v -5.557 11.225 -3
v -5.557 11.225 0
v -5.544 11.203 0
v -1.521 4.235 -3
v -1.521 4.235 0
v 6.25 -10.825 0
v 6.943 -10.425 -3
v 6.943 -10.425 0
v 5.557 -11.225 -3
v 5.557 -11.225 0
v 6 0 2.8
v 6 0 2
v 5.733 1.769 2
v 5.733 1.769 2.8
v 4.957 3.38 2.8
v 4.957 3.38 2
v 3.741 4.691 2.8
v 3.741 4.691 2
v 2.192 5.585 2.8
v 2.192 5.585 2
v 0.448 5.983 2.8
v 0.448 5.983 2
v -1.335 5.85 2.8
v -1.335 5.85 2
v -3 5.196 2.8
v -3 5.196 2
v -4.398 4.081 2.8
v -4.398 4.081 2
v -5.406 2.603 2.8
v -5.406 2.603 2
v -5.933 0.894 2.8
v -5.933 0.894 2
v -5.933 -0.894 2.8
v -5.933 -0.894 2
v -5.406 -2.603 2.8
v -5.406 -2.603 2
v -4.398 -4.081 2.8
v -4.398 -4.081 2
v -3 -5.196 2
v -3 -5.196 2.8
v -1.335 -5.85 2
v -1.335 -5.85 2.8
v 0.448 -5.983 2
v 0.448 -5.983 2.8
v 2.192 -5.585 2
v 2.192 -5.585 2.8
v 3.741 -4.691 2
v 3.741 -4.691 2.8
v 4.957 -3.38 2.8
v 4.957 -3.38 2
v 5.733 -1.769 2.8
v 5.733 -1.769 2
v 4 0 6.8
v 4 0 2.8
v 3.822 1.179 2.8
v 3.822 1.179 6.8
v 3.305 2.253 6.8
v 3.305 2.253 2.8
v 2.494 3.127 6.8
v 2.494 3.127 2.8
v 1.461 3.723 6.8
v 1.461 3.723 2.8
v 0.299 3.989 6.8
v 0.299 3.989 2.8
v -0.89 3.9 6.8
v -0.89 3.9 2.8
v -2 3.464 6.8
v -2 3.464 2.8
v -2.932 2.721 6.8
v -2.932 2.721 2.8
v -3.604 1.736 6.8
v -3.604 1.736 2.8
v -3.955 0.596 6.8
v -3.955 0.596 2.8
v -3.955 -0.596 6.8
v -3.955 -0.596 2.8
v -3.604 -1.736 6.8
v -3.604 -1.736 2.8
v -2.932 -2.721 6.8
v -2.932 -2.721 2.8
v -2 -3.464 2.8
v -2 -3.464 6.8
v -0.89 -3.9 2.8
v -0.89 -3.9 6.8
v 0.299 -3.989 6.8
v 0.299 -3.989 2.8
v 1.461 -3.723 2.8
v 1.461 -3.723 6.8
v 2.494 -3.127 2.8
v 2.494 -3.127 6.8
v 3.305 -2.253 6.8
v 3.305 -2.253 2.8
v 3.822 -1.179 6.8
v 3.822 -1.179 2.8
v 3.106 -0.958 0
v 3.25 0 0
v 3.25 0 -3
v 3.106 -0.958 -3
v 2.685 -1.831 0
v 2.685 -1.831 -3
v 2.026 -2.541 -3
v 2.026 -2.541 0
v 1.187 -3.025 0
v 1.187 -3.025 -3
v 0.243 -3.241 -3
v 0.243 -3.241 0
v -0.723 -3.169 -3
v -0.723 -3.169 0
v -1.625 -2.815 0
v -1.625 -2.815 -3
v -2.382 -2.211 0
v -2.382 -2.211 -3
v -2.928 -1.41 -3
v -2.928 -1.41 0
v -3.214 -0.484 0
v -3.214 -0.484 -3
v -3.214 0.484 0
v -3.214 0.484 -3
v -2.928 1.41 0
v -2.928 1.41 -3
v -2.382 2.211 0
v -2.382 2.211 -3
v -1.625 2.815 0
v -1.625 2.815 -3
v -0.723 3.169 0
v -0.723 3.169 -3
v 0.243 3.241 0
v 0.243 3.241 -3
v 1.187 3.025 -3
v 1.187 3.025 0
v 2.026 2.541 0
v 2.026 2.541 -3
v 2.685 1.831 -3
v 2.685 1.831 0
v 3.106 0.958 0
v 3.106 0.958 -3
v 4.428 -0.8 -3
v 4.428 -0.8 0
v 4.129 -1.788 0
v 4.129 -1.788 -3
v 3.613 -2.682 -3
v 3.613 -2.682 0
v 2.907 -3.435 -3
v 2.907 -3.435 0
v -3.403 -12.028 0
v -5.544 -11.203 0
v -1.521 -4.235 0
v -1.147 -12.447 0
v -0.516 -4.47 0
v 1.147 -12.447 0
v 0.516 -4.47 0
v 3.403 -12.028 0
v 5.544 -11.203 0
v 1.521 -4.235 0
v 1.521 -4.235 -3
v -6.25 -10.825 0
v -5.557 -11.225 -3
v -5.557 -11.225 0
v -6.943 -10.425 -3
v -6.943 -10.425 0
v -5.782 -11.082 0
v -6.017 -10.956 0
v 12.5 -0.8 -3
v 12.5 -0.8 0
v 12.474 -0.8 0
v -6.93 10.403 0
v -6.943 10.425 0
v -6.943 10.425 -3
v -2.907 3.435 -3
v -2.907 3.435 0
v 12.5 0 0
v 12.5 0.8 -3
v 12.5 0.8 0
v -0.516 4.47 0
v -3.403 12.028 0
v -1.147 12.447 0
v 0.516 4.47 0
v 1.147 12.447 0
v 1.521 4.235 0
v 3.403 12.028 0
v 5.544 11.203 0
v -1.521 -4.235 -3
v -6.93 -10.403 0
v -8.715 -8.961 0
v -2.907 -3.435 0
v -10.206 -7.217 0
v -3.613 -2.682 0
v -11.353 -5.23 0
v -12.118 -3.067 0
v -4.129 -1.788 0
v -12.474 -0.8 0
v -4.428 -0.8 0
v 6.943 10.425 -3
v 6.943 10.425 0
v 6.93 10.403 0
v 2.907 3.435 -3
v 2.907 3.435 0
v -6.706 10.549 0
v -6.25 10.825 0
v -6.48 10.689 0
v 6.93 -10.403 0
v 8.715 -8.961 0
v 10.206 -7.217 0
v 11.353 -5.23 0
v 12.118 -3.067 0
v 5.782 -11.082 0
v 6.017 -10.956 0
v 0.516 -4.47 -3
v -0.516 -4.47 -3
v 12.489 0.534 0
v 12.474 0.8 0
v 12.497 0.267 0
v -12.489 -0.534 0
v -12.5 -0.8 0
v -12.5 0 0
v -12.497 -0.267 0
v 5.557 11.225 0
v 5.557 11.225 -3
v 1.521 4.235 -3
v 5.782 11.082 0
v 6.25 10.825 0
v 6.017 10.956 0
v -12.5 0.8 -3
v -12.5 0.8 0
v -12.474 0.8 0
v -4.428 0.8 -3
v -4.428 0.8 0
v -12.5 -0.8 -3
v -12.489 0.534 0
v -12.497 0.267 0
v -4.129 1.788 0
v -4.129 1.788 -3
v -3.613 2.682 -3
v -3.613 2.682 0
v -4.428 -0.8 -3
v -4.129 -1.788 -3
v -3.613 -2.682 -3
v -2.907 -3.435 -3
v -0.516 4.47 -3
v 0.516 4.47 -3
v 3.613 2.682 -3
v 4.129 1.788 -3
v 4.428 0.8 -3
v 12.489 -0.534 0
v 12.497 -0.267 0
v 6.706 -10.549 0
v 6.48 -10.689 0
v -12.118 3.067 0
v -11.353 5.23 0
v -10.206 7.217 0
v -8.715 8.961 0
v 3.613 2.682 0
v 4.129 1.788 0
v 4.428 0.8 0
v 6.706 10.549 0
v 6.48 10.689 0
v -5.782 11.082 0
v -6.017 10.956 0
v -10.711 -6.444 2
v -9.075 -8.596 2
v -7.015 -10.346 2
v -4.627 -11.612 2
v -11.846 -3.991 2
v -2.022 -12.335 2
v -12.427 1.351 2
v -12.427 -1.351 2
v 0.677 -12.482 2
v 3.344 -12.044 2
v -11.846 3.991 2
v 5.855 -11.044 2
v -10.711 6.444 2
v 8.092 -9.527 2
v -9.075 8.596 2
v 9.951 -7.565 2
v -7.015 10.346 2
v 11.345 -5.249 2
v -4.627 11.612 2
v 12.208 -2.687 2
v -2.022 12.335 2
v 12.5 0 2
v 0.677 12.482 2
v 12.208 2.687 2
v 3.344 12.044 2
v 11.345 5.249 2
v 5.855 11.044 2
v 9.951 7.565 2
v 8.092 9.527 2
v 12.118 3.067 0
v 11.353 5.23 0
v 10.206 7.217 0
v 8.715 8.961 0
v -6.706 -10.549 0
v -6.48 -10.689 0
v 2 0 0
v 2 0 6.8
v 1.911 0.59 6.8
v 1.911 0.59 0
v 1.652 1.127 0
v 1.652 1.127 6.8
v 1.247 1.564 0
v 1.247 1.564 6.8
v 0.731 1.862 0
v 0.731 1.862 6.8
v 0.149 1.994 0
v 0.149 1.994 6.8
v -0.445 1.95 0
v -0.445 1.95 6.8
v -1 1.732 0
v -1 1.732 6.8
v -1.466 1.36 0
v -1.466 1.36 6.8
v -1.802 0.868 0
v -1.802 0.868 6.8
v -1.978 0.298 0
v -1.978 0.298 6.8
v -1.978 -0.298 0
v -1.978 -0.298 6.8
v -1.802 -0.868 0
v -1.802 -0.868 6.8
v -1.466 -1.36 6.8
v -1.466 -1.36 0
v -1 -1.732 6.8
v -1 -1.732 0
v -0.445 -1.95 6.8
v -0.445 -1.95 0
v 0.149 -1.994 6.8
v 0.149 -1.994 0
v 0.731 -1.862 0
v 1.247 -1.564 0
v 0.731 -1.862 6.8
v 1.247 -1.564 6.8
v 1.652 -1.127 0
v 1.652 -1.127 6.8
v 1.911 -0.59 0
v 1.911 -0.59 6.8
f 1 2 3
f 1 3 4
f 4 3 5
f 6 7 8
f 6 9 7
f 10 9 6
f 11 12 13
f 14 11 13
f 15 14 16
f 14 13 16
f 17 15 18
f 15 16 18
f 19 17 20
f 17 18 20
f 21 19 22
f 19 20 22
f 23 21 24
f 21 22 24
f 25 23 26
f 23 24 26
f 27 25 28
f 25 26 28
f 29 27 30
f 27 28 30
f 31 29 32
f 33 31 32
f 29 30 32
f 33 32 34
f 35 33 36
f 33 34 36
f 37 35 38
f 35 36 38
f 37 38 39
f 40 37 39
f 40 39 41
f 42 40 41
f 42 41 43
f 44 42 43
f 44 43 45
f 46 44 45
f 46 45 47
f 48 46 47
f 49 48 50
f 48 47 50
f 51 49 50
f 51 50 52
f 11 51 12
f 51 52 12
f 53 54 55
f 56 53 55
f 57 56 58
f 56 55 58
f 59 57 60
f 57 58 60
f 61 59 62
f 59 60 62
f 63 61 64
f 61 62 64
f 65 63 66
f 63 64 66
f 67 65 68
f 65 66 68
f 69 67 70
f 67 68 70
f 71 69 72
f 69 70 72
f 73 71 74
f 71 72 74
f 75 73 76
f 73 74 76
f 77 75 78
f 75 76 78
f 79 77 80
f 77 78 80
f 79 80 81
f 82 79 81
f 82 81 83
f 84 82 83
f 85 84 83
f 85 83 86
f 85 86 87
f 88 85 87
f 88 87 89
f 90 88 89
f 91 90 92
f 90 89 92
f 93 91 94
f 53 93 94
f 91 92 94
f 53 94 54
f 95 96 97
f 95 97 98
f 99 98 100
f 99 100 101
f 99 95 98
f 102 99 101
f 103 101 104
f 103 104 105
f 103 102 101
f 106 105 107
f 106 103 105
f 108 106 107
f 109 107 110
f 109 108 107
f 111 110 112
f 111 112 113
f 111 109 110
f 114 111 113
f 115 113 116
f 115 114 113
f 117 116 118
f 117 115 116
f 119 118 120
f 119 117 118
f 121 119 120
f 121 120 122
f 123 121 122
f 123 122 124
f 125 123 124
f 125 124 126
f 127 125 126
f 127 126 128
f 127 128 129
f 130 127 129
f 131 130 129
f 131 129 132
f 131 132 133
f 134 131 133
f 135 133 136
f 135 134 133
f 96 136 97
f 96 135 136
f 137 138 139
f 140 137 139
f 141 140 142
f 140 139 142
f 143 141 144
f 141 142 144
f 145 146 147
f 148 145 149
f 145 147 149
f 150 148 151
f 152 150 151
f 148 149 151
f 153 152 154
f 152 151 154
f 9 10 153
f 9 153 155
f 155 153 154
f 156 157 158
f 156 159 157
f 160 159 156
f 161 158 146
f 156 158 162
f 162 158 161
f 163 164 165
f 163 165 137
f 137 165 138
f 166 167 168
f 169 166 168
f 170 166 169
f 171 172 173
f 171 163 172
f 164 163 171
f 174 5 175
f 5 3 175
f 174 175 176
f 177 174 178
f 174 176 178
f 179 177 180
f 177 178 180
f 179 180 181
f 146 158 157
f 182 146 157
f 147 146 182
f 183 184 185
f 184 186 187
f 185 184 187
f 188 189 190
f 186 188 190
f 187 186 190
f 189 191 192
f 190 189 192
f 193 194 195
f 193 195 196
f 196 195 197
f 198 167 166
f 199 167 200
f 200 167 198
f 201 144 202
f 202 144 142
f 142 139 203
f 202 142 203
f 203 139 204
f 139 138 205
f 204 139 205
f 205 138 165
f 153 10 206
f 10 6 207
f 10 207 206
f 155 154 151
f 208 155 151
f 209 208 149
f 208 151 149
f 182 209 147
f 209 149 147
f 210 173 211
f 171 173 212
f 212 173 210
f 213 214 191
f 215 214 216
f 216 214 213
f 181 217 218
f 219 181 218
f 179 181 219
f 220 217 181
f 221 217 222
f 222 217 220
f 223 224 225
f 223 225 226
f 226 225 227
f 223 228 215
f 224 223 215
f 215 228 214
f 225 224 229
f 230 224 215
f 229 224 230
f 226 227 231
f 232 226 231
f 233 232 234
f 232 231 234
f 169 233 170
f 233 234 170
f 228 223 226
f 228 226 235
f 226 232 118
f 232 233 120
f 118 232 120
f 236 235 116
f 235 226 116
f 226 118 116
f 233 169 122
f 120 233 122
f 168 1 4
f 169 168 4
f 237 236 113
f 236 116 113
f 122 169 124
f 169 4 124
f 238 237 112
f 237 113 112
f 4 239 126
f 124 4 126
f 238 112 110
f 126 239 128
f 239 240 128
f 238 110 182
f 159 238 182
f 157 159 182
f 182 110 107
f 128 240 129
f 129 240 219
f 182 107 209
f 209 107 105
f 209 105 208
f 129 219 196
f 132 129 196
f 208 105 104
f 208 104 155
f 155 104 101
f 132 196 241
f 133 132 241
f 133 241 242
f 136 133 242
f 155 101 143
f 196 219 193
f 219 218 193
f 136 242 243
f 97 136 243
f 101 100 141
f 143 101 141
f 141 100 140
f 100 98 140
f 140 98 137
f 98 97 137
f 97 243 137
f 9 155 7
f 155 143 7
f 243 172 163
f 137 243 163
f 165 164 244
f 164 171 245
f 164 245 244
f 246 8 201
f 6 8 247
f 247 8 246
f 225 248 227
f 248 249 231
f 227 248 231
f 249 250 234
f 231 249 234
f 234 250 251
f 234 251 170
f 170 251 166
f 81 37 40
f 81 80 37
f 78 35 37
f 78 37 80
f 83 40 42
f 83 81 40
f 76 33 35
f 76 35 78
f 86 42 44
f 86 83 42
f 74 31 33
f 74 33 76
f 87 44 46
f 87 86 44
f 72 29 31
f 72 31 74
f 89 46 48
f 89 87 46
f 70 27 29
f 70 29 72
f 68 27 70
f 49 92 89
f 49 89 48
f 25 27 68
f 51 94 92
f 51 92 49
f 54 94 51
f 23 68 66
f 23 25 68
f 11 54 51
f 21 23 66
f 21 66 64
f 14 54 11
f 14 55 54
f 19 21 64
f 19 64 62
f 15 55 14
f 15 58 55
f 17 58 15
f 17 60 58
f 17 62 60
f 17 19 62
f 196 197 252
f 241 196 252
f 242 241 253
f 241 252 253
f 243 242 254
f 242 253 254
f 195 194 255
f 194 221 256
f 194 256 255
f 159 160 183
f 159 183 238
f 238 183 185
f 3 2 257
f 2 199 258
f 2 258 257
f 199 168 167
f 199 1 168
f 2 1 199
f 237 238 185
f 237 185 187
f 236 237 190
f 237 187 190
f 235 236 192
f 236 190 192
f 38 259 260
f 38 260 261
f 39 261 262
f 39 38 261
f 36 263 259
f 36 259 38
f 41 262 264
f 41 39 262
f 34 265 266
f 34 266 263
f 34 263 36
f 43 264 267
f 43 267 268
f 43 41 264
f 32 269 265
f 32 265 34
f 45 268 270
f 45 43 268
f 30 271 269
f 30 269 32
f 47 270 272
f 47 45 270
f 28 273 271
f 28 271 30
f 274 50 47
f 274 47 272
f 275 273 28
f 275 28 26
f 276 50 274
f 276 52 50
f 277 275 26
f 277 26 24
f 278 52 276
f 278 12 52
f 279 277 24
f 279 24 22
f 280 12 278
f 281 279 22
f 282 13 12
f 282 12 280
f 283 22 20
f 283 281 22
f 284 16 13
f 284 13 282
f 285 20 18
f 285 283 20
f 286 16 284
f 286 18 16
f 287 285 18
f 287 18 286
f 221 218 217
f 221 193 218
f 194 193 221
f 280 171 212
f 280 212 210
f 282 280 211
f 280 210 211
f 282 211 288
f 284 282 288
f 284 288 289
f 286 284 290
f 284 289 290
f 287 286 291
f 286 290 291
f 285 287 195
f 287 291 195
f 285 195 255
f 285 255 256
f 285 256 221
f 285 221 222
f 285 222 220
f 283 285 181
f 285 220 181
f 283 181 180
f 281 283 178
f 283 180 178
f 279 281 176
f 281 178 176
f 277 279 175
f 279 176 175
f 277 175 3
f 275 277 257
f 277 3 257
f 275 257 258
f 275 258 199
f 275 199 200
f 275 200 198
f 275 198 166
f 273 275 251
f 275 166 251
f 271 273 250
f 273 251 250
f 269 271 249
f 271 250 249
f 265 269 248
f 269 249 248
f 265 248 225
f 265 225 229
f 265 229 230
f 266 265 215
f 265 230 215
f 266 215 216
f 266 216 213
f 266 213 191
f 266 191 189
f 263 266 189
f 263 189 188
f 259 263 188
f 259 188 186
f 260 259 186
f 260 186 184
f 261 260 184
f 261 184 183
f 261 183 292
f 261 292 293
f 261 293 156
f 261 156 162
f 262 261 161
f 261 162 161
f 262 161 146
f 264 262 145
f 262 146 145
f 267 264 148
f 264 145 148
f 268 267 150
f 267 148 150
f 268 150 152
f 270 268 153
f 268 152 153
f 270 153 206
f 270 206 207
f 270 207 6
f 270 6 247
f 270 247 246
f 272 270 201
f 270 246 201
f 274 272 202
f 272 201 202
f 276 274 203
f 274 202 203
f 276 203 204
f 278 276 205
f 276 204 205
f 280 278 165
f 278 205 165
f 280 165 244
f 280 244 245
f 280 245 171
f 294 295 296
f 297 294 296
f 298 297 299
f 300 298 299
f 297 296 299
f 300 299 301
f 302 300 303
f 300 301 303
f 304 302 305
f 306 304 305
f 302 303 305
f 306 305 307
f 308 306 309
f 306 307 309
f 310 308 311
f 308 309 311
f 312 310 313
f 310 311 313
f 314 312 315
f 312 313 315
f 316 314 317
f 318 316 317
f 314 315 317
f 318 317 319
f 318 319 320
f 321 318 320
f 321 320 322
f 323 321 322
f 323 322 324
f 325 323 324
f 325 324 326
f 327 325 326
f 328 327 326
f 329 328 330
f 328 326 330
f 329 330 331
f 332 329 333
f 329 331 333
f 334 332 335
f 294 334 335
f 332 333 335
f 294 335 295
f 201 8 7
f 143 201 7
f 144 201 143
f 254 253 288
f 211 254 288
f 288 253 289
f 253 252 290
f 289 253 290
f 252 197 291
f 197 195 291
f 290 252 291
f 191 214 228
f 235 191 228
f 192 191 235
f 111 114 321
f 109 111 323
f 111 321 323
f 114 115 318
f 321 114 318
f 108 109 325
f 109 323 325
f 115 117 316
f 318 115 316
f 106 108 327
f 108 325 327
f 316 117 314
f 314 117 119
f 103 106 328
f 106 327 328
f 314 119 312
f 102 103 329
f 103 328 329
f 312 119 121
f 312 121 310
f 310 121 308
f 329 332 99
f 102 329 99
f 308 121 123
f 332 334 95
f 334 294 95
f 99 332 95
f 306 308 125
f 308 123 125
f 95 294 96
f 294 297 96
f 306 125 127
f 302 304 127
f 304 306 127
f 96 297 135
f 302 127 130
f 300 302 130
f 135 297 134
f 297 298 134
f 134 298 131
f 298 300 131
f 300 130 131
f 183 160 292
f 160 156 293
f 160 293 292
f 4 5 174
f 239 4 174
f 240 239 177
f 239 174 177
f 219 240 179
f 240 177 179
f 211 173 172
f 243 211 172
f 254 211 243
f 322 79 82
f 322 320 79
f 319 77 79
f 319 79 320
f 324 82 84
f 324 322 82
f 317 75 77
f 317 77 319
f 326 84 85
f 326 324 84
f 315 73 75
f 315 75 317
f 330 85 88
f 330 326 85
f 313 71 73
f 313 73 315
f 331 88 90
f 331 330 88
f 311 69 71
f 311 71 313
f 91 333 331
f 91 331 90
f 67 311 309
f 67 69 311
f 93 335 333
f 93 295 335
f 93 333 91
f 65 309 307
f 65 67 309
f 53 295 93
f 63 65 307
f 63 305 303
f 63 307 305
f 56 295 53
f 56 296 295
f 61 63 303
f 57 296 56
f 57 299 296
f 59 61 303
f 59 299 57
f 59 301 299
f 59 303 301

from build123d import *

# Parameters (mm, degrees)
F0_R             = 12.5
F1_DEPTH         = 2
F2_R             = 6
F3_DEPTH         = 0.8
F4_R             = 4
F5_DEPTH         = 4
F6_R             = 2
F7_DEPTH         = 6.8
F8_R             = 4.5
F8_R_2           = 3.25
F9_DEPTH         = 3
F10_W            = 8.2
F10_H            = 3
F11_DEPTH        = 0.8
F11_DEPTH_BACK   = 0.8
F11_COPIES_COUNT = 6


# Not quite as in the source:
# - a pattern or mirror of a feature is missing from the dataset's text; its kind, count and spacing are read off the source's solid


with BuildPart() as f1:
    # F0 (on Top) → F1 (new body)
    with BuildSketch(Plane.XY):
        Circle(F0_R)
    extrude(amount=F1_DEPTH)

    # F2 (on face) → F3 (join)
    with BuildSketch(Plane.XY.offset(2)):
        Circle(F2_R)
    extrude(amount=F3_DEPTH)

    # F4 (on face) → F5 (join)
    with BuildSketch(Plane.XY.offset(2.8)):
        Circle(F4_R)
    extrude(amount=F5_DEPTH)

    # F6 (on face) → F7 (cut, through all)
    with BuildSketch(Plane.XY.offset(6.8)):
        Circle(F6_R)
    extrude(amount=-F7_DEPTH, mode=Mode.SUBTRACT)

    # F8 (on face) → F9 (join)
    with BuildSketch(Plane(origin=(0, 0, 0), x_dir=(1, 0, 0), z_dir=(0, 0, -1))):
        Circle(F8_R)
        Circle(F8_R_2, mode=Mode.SUBTRACT)
    extrude(amount=F9_DEPTH)

    # F10 (on Front) → F11 (join, two sides)
    with BuildSketch(Plane.XZ) as f11_sk:
        with Locations((-8.4, -1.5)):
            Rectangle(F10_W, F10_H)
    f11 = extrude(amount=F11_DEPTH) + extrude(f11_sk.sketch, amount=-F11_DEPTH_BACK)

    # F11_copies: F11 ×6 about axis
    f11_copies_axis = Axis((0, 0, 0), (0, 0, 1))
    for i in range(1, F11_COPIES_COUNT):
        add(f11.rotate(f11_copies_axis, i * 360 / F11_COPIES_COUNT))


solid = f1.part
